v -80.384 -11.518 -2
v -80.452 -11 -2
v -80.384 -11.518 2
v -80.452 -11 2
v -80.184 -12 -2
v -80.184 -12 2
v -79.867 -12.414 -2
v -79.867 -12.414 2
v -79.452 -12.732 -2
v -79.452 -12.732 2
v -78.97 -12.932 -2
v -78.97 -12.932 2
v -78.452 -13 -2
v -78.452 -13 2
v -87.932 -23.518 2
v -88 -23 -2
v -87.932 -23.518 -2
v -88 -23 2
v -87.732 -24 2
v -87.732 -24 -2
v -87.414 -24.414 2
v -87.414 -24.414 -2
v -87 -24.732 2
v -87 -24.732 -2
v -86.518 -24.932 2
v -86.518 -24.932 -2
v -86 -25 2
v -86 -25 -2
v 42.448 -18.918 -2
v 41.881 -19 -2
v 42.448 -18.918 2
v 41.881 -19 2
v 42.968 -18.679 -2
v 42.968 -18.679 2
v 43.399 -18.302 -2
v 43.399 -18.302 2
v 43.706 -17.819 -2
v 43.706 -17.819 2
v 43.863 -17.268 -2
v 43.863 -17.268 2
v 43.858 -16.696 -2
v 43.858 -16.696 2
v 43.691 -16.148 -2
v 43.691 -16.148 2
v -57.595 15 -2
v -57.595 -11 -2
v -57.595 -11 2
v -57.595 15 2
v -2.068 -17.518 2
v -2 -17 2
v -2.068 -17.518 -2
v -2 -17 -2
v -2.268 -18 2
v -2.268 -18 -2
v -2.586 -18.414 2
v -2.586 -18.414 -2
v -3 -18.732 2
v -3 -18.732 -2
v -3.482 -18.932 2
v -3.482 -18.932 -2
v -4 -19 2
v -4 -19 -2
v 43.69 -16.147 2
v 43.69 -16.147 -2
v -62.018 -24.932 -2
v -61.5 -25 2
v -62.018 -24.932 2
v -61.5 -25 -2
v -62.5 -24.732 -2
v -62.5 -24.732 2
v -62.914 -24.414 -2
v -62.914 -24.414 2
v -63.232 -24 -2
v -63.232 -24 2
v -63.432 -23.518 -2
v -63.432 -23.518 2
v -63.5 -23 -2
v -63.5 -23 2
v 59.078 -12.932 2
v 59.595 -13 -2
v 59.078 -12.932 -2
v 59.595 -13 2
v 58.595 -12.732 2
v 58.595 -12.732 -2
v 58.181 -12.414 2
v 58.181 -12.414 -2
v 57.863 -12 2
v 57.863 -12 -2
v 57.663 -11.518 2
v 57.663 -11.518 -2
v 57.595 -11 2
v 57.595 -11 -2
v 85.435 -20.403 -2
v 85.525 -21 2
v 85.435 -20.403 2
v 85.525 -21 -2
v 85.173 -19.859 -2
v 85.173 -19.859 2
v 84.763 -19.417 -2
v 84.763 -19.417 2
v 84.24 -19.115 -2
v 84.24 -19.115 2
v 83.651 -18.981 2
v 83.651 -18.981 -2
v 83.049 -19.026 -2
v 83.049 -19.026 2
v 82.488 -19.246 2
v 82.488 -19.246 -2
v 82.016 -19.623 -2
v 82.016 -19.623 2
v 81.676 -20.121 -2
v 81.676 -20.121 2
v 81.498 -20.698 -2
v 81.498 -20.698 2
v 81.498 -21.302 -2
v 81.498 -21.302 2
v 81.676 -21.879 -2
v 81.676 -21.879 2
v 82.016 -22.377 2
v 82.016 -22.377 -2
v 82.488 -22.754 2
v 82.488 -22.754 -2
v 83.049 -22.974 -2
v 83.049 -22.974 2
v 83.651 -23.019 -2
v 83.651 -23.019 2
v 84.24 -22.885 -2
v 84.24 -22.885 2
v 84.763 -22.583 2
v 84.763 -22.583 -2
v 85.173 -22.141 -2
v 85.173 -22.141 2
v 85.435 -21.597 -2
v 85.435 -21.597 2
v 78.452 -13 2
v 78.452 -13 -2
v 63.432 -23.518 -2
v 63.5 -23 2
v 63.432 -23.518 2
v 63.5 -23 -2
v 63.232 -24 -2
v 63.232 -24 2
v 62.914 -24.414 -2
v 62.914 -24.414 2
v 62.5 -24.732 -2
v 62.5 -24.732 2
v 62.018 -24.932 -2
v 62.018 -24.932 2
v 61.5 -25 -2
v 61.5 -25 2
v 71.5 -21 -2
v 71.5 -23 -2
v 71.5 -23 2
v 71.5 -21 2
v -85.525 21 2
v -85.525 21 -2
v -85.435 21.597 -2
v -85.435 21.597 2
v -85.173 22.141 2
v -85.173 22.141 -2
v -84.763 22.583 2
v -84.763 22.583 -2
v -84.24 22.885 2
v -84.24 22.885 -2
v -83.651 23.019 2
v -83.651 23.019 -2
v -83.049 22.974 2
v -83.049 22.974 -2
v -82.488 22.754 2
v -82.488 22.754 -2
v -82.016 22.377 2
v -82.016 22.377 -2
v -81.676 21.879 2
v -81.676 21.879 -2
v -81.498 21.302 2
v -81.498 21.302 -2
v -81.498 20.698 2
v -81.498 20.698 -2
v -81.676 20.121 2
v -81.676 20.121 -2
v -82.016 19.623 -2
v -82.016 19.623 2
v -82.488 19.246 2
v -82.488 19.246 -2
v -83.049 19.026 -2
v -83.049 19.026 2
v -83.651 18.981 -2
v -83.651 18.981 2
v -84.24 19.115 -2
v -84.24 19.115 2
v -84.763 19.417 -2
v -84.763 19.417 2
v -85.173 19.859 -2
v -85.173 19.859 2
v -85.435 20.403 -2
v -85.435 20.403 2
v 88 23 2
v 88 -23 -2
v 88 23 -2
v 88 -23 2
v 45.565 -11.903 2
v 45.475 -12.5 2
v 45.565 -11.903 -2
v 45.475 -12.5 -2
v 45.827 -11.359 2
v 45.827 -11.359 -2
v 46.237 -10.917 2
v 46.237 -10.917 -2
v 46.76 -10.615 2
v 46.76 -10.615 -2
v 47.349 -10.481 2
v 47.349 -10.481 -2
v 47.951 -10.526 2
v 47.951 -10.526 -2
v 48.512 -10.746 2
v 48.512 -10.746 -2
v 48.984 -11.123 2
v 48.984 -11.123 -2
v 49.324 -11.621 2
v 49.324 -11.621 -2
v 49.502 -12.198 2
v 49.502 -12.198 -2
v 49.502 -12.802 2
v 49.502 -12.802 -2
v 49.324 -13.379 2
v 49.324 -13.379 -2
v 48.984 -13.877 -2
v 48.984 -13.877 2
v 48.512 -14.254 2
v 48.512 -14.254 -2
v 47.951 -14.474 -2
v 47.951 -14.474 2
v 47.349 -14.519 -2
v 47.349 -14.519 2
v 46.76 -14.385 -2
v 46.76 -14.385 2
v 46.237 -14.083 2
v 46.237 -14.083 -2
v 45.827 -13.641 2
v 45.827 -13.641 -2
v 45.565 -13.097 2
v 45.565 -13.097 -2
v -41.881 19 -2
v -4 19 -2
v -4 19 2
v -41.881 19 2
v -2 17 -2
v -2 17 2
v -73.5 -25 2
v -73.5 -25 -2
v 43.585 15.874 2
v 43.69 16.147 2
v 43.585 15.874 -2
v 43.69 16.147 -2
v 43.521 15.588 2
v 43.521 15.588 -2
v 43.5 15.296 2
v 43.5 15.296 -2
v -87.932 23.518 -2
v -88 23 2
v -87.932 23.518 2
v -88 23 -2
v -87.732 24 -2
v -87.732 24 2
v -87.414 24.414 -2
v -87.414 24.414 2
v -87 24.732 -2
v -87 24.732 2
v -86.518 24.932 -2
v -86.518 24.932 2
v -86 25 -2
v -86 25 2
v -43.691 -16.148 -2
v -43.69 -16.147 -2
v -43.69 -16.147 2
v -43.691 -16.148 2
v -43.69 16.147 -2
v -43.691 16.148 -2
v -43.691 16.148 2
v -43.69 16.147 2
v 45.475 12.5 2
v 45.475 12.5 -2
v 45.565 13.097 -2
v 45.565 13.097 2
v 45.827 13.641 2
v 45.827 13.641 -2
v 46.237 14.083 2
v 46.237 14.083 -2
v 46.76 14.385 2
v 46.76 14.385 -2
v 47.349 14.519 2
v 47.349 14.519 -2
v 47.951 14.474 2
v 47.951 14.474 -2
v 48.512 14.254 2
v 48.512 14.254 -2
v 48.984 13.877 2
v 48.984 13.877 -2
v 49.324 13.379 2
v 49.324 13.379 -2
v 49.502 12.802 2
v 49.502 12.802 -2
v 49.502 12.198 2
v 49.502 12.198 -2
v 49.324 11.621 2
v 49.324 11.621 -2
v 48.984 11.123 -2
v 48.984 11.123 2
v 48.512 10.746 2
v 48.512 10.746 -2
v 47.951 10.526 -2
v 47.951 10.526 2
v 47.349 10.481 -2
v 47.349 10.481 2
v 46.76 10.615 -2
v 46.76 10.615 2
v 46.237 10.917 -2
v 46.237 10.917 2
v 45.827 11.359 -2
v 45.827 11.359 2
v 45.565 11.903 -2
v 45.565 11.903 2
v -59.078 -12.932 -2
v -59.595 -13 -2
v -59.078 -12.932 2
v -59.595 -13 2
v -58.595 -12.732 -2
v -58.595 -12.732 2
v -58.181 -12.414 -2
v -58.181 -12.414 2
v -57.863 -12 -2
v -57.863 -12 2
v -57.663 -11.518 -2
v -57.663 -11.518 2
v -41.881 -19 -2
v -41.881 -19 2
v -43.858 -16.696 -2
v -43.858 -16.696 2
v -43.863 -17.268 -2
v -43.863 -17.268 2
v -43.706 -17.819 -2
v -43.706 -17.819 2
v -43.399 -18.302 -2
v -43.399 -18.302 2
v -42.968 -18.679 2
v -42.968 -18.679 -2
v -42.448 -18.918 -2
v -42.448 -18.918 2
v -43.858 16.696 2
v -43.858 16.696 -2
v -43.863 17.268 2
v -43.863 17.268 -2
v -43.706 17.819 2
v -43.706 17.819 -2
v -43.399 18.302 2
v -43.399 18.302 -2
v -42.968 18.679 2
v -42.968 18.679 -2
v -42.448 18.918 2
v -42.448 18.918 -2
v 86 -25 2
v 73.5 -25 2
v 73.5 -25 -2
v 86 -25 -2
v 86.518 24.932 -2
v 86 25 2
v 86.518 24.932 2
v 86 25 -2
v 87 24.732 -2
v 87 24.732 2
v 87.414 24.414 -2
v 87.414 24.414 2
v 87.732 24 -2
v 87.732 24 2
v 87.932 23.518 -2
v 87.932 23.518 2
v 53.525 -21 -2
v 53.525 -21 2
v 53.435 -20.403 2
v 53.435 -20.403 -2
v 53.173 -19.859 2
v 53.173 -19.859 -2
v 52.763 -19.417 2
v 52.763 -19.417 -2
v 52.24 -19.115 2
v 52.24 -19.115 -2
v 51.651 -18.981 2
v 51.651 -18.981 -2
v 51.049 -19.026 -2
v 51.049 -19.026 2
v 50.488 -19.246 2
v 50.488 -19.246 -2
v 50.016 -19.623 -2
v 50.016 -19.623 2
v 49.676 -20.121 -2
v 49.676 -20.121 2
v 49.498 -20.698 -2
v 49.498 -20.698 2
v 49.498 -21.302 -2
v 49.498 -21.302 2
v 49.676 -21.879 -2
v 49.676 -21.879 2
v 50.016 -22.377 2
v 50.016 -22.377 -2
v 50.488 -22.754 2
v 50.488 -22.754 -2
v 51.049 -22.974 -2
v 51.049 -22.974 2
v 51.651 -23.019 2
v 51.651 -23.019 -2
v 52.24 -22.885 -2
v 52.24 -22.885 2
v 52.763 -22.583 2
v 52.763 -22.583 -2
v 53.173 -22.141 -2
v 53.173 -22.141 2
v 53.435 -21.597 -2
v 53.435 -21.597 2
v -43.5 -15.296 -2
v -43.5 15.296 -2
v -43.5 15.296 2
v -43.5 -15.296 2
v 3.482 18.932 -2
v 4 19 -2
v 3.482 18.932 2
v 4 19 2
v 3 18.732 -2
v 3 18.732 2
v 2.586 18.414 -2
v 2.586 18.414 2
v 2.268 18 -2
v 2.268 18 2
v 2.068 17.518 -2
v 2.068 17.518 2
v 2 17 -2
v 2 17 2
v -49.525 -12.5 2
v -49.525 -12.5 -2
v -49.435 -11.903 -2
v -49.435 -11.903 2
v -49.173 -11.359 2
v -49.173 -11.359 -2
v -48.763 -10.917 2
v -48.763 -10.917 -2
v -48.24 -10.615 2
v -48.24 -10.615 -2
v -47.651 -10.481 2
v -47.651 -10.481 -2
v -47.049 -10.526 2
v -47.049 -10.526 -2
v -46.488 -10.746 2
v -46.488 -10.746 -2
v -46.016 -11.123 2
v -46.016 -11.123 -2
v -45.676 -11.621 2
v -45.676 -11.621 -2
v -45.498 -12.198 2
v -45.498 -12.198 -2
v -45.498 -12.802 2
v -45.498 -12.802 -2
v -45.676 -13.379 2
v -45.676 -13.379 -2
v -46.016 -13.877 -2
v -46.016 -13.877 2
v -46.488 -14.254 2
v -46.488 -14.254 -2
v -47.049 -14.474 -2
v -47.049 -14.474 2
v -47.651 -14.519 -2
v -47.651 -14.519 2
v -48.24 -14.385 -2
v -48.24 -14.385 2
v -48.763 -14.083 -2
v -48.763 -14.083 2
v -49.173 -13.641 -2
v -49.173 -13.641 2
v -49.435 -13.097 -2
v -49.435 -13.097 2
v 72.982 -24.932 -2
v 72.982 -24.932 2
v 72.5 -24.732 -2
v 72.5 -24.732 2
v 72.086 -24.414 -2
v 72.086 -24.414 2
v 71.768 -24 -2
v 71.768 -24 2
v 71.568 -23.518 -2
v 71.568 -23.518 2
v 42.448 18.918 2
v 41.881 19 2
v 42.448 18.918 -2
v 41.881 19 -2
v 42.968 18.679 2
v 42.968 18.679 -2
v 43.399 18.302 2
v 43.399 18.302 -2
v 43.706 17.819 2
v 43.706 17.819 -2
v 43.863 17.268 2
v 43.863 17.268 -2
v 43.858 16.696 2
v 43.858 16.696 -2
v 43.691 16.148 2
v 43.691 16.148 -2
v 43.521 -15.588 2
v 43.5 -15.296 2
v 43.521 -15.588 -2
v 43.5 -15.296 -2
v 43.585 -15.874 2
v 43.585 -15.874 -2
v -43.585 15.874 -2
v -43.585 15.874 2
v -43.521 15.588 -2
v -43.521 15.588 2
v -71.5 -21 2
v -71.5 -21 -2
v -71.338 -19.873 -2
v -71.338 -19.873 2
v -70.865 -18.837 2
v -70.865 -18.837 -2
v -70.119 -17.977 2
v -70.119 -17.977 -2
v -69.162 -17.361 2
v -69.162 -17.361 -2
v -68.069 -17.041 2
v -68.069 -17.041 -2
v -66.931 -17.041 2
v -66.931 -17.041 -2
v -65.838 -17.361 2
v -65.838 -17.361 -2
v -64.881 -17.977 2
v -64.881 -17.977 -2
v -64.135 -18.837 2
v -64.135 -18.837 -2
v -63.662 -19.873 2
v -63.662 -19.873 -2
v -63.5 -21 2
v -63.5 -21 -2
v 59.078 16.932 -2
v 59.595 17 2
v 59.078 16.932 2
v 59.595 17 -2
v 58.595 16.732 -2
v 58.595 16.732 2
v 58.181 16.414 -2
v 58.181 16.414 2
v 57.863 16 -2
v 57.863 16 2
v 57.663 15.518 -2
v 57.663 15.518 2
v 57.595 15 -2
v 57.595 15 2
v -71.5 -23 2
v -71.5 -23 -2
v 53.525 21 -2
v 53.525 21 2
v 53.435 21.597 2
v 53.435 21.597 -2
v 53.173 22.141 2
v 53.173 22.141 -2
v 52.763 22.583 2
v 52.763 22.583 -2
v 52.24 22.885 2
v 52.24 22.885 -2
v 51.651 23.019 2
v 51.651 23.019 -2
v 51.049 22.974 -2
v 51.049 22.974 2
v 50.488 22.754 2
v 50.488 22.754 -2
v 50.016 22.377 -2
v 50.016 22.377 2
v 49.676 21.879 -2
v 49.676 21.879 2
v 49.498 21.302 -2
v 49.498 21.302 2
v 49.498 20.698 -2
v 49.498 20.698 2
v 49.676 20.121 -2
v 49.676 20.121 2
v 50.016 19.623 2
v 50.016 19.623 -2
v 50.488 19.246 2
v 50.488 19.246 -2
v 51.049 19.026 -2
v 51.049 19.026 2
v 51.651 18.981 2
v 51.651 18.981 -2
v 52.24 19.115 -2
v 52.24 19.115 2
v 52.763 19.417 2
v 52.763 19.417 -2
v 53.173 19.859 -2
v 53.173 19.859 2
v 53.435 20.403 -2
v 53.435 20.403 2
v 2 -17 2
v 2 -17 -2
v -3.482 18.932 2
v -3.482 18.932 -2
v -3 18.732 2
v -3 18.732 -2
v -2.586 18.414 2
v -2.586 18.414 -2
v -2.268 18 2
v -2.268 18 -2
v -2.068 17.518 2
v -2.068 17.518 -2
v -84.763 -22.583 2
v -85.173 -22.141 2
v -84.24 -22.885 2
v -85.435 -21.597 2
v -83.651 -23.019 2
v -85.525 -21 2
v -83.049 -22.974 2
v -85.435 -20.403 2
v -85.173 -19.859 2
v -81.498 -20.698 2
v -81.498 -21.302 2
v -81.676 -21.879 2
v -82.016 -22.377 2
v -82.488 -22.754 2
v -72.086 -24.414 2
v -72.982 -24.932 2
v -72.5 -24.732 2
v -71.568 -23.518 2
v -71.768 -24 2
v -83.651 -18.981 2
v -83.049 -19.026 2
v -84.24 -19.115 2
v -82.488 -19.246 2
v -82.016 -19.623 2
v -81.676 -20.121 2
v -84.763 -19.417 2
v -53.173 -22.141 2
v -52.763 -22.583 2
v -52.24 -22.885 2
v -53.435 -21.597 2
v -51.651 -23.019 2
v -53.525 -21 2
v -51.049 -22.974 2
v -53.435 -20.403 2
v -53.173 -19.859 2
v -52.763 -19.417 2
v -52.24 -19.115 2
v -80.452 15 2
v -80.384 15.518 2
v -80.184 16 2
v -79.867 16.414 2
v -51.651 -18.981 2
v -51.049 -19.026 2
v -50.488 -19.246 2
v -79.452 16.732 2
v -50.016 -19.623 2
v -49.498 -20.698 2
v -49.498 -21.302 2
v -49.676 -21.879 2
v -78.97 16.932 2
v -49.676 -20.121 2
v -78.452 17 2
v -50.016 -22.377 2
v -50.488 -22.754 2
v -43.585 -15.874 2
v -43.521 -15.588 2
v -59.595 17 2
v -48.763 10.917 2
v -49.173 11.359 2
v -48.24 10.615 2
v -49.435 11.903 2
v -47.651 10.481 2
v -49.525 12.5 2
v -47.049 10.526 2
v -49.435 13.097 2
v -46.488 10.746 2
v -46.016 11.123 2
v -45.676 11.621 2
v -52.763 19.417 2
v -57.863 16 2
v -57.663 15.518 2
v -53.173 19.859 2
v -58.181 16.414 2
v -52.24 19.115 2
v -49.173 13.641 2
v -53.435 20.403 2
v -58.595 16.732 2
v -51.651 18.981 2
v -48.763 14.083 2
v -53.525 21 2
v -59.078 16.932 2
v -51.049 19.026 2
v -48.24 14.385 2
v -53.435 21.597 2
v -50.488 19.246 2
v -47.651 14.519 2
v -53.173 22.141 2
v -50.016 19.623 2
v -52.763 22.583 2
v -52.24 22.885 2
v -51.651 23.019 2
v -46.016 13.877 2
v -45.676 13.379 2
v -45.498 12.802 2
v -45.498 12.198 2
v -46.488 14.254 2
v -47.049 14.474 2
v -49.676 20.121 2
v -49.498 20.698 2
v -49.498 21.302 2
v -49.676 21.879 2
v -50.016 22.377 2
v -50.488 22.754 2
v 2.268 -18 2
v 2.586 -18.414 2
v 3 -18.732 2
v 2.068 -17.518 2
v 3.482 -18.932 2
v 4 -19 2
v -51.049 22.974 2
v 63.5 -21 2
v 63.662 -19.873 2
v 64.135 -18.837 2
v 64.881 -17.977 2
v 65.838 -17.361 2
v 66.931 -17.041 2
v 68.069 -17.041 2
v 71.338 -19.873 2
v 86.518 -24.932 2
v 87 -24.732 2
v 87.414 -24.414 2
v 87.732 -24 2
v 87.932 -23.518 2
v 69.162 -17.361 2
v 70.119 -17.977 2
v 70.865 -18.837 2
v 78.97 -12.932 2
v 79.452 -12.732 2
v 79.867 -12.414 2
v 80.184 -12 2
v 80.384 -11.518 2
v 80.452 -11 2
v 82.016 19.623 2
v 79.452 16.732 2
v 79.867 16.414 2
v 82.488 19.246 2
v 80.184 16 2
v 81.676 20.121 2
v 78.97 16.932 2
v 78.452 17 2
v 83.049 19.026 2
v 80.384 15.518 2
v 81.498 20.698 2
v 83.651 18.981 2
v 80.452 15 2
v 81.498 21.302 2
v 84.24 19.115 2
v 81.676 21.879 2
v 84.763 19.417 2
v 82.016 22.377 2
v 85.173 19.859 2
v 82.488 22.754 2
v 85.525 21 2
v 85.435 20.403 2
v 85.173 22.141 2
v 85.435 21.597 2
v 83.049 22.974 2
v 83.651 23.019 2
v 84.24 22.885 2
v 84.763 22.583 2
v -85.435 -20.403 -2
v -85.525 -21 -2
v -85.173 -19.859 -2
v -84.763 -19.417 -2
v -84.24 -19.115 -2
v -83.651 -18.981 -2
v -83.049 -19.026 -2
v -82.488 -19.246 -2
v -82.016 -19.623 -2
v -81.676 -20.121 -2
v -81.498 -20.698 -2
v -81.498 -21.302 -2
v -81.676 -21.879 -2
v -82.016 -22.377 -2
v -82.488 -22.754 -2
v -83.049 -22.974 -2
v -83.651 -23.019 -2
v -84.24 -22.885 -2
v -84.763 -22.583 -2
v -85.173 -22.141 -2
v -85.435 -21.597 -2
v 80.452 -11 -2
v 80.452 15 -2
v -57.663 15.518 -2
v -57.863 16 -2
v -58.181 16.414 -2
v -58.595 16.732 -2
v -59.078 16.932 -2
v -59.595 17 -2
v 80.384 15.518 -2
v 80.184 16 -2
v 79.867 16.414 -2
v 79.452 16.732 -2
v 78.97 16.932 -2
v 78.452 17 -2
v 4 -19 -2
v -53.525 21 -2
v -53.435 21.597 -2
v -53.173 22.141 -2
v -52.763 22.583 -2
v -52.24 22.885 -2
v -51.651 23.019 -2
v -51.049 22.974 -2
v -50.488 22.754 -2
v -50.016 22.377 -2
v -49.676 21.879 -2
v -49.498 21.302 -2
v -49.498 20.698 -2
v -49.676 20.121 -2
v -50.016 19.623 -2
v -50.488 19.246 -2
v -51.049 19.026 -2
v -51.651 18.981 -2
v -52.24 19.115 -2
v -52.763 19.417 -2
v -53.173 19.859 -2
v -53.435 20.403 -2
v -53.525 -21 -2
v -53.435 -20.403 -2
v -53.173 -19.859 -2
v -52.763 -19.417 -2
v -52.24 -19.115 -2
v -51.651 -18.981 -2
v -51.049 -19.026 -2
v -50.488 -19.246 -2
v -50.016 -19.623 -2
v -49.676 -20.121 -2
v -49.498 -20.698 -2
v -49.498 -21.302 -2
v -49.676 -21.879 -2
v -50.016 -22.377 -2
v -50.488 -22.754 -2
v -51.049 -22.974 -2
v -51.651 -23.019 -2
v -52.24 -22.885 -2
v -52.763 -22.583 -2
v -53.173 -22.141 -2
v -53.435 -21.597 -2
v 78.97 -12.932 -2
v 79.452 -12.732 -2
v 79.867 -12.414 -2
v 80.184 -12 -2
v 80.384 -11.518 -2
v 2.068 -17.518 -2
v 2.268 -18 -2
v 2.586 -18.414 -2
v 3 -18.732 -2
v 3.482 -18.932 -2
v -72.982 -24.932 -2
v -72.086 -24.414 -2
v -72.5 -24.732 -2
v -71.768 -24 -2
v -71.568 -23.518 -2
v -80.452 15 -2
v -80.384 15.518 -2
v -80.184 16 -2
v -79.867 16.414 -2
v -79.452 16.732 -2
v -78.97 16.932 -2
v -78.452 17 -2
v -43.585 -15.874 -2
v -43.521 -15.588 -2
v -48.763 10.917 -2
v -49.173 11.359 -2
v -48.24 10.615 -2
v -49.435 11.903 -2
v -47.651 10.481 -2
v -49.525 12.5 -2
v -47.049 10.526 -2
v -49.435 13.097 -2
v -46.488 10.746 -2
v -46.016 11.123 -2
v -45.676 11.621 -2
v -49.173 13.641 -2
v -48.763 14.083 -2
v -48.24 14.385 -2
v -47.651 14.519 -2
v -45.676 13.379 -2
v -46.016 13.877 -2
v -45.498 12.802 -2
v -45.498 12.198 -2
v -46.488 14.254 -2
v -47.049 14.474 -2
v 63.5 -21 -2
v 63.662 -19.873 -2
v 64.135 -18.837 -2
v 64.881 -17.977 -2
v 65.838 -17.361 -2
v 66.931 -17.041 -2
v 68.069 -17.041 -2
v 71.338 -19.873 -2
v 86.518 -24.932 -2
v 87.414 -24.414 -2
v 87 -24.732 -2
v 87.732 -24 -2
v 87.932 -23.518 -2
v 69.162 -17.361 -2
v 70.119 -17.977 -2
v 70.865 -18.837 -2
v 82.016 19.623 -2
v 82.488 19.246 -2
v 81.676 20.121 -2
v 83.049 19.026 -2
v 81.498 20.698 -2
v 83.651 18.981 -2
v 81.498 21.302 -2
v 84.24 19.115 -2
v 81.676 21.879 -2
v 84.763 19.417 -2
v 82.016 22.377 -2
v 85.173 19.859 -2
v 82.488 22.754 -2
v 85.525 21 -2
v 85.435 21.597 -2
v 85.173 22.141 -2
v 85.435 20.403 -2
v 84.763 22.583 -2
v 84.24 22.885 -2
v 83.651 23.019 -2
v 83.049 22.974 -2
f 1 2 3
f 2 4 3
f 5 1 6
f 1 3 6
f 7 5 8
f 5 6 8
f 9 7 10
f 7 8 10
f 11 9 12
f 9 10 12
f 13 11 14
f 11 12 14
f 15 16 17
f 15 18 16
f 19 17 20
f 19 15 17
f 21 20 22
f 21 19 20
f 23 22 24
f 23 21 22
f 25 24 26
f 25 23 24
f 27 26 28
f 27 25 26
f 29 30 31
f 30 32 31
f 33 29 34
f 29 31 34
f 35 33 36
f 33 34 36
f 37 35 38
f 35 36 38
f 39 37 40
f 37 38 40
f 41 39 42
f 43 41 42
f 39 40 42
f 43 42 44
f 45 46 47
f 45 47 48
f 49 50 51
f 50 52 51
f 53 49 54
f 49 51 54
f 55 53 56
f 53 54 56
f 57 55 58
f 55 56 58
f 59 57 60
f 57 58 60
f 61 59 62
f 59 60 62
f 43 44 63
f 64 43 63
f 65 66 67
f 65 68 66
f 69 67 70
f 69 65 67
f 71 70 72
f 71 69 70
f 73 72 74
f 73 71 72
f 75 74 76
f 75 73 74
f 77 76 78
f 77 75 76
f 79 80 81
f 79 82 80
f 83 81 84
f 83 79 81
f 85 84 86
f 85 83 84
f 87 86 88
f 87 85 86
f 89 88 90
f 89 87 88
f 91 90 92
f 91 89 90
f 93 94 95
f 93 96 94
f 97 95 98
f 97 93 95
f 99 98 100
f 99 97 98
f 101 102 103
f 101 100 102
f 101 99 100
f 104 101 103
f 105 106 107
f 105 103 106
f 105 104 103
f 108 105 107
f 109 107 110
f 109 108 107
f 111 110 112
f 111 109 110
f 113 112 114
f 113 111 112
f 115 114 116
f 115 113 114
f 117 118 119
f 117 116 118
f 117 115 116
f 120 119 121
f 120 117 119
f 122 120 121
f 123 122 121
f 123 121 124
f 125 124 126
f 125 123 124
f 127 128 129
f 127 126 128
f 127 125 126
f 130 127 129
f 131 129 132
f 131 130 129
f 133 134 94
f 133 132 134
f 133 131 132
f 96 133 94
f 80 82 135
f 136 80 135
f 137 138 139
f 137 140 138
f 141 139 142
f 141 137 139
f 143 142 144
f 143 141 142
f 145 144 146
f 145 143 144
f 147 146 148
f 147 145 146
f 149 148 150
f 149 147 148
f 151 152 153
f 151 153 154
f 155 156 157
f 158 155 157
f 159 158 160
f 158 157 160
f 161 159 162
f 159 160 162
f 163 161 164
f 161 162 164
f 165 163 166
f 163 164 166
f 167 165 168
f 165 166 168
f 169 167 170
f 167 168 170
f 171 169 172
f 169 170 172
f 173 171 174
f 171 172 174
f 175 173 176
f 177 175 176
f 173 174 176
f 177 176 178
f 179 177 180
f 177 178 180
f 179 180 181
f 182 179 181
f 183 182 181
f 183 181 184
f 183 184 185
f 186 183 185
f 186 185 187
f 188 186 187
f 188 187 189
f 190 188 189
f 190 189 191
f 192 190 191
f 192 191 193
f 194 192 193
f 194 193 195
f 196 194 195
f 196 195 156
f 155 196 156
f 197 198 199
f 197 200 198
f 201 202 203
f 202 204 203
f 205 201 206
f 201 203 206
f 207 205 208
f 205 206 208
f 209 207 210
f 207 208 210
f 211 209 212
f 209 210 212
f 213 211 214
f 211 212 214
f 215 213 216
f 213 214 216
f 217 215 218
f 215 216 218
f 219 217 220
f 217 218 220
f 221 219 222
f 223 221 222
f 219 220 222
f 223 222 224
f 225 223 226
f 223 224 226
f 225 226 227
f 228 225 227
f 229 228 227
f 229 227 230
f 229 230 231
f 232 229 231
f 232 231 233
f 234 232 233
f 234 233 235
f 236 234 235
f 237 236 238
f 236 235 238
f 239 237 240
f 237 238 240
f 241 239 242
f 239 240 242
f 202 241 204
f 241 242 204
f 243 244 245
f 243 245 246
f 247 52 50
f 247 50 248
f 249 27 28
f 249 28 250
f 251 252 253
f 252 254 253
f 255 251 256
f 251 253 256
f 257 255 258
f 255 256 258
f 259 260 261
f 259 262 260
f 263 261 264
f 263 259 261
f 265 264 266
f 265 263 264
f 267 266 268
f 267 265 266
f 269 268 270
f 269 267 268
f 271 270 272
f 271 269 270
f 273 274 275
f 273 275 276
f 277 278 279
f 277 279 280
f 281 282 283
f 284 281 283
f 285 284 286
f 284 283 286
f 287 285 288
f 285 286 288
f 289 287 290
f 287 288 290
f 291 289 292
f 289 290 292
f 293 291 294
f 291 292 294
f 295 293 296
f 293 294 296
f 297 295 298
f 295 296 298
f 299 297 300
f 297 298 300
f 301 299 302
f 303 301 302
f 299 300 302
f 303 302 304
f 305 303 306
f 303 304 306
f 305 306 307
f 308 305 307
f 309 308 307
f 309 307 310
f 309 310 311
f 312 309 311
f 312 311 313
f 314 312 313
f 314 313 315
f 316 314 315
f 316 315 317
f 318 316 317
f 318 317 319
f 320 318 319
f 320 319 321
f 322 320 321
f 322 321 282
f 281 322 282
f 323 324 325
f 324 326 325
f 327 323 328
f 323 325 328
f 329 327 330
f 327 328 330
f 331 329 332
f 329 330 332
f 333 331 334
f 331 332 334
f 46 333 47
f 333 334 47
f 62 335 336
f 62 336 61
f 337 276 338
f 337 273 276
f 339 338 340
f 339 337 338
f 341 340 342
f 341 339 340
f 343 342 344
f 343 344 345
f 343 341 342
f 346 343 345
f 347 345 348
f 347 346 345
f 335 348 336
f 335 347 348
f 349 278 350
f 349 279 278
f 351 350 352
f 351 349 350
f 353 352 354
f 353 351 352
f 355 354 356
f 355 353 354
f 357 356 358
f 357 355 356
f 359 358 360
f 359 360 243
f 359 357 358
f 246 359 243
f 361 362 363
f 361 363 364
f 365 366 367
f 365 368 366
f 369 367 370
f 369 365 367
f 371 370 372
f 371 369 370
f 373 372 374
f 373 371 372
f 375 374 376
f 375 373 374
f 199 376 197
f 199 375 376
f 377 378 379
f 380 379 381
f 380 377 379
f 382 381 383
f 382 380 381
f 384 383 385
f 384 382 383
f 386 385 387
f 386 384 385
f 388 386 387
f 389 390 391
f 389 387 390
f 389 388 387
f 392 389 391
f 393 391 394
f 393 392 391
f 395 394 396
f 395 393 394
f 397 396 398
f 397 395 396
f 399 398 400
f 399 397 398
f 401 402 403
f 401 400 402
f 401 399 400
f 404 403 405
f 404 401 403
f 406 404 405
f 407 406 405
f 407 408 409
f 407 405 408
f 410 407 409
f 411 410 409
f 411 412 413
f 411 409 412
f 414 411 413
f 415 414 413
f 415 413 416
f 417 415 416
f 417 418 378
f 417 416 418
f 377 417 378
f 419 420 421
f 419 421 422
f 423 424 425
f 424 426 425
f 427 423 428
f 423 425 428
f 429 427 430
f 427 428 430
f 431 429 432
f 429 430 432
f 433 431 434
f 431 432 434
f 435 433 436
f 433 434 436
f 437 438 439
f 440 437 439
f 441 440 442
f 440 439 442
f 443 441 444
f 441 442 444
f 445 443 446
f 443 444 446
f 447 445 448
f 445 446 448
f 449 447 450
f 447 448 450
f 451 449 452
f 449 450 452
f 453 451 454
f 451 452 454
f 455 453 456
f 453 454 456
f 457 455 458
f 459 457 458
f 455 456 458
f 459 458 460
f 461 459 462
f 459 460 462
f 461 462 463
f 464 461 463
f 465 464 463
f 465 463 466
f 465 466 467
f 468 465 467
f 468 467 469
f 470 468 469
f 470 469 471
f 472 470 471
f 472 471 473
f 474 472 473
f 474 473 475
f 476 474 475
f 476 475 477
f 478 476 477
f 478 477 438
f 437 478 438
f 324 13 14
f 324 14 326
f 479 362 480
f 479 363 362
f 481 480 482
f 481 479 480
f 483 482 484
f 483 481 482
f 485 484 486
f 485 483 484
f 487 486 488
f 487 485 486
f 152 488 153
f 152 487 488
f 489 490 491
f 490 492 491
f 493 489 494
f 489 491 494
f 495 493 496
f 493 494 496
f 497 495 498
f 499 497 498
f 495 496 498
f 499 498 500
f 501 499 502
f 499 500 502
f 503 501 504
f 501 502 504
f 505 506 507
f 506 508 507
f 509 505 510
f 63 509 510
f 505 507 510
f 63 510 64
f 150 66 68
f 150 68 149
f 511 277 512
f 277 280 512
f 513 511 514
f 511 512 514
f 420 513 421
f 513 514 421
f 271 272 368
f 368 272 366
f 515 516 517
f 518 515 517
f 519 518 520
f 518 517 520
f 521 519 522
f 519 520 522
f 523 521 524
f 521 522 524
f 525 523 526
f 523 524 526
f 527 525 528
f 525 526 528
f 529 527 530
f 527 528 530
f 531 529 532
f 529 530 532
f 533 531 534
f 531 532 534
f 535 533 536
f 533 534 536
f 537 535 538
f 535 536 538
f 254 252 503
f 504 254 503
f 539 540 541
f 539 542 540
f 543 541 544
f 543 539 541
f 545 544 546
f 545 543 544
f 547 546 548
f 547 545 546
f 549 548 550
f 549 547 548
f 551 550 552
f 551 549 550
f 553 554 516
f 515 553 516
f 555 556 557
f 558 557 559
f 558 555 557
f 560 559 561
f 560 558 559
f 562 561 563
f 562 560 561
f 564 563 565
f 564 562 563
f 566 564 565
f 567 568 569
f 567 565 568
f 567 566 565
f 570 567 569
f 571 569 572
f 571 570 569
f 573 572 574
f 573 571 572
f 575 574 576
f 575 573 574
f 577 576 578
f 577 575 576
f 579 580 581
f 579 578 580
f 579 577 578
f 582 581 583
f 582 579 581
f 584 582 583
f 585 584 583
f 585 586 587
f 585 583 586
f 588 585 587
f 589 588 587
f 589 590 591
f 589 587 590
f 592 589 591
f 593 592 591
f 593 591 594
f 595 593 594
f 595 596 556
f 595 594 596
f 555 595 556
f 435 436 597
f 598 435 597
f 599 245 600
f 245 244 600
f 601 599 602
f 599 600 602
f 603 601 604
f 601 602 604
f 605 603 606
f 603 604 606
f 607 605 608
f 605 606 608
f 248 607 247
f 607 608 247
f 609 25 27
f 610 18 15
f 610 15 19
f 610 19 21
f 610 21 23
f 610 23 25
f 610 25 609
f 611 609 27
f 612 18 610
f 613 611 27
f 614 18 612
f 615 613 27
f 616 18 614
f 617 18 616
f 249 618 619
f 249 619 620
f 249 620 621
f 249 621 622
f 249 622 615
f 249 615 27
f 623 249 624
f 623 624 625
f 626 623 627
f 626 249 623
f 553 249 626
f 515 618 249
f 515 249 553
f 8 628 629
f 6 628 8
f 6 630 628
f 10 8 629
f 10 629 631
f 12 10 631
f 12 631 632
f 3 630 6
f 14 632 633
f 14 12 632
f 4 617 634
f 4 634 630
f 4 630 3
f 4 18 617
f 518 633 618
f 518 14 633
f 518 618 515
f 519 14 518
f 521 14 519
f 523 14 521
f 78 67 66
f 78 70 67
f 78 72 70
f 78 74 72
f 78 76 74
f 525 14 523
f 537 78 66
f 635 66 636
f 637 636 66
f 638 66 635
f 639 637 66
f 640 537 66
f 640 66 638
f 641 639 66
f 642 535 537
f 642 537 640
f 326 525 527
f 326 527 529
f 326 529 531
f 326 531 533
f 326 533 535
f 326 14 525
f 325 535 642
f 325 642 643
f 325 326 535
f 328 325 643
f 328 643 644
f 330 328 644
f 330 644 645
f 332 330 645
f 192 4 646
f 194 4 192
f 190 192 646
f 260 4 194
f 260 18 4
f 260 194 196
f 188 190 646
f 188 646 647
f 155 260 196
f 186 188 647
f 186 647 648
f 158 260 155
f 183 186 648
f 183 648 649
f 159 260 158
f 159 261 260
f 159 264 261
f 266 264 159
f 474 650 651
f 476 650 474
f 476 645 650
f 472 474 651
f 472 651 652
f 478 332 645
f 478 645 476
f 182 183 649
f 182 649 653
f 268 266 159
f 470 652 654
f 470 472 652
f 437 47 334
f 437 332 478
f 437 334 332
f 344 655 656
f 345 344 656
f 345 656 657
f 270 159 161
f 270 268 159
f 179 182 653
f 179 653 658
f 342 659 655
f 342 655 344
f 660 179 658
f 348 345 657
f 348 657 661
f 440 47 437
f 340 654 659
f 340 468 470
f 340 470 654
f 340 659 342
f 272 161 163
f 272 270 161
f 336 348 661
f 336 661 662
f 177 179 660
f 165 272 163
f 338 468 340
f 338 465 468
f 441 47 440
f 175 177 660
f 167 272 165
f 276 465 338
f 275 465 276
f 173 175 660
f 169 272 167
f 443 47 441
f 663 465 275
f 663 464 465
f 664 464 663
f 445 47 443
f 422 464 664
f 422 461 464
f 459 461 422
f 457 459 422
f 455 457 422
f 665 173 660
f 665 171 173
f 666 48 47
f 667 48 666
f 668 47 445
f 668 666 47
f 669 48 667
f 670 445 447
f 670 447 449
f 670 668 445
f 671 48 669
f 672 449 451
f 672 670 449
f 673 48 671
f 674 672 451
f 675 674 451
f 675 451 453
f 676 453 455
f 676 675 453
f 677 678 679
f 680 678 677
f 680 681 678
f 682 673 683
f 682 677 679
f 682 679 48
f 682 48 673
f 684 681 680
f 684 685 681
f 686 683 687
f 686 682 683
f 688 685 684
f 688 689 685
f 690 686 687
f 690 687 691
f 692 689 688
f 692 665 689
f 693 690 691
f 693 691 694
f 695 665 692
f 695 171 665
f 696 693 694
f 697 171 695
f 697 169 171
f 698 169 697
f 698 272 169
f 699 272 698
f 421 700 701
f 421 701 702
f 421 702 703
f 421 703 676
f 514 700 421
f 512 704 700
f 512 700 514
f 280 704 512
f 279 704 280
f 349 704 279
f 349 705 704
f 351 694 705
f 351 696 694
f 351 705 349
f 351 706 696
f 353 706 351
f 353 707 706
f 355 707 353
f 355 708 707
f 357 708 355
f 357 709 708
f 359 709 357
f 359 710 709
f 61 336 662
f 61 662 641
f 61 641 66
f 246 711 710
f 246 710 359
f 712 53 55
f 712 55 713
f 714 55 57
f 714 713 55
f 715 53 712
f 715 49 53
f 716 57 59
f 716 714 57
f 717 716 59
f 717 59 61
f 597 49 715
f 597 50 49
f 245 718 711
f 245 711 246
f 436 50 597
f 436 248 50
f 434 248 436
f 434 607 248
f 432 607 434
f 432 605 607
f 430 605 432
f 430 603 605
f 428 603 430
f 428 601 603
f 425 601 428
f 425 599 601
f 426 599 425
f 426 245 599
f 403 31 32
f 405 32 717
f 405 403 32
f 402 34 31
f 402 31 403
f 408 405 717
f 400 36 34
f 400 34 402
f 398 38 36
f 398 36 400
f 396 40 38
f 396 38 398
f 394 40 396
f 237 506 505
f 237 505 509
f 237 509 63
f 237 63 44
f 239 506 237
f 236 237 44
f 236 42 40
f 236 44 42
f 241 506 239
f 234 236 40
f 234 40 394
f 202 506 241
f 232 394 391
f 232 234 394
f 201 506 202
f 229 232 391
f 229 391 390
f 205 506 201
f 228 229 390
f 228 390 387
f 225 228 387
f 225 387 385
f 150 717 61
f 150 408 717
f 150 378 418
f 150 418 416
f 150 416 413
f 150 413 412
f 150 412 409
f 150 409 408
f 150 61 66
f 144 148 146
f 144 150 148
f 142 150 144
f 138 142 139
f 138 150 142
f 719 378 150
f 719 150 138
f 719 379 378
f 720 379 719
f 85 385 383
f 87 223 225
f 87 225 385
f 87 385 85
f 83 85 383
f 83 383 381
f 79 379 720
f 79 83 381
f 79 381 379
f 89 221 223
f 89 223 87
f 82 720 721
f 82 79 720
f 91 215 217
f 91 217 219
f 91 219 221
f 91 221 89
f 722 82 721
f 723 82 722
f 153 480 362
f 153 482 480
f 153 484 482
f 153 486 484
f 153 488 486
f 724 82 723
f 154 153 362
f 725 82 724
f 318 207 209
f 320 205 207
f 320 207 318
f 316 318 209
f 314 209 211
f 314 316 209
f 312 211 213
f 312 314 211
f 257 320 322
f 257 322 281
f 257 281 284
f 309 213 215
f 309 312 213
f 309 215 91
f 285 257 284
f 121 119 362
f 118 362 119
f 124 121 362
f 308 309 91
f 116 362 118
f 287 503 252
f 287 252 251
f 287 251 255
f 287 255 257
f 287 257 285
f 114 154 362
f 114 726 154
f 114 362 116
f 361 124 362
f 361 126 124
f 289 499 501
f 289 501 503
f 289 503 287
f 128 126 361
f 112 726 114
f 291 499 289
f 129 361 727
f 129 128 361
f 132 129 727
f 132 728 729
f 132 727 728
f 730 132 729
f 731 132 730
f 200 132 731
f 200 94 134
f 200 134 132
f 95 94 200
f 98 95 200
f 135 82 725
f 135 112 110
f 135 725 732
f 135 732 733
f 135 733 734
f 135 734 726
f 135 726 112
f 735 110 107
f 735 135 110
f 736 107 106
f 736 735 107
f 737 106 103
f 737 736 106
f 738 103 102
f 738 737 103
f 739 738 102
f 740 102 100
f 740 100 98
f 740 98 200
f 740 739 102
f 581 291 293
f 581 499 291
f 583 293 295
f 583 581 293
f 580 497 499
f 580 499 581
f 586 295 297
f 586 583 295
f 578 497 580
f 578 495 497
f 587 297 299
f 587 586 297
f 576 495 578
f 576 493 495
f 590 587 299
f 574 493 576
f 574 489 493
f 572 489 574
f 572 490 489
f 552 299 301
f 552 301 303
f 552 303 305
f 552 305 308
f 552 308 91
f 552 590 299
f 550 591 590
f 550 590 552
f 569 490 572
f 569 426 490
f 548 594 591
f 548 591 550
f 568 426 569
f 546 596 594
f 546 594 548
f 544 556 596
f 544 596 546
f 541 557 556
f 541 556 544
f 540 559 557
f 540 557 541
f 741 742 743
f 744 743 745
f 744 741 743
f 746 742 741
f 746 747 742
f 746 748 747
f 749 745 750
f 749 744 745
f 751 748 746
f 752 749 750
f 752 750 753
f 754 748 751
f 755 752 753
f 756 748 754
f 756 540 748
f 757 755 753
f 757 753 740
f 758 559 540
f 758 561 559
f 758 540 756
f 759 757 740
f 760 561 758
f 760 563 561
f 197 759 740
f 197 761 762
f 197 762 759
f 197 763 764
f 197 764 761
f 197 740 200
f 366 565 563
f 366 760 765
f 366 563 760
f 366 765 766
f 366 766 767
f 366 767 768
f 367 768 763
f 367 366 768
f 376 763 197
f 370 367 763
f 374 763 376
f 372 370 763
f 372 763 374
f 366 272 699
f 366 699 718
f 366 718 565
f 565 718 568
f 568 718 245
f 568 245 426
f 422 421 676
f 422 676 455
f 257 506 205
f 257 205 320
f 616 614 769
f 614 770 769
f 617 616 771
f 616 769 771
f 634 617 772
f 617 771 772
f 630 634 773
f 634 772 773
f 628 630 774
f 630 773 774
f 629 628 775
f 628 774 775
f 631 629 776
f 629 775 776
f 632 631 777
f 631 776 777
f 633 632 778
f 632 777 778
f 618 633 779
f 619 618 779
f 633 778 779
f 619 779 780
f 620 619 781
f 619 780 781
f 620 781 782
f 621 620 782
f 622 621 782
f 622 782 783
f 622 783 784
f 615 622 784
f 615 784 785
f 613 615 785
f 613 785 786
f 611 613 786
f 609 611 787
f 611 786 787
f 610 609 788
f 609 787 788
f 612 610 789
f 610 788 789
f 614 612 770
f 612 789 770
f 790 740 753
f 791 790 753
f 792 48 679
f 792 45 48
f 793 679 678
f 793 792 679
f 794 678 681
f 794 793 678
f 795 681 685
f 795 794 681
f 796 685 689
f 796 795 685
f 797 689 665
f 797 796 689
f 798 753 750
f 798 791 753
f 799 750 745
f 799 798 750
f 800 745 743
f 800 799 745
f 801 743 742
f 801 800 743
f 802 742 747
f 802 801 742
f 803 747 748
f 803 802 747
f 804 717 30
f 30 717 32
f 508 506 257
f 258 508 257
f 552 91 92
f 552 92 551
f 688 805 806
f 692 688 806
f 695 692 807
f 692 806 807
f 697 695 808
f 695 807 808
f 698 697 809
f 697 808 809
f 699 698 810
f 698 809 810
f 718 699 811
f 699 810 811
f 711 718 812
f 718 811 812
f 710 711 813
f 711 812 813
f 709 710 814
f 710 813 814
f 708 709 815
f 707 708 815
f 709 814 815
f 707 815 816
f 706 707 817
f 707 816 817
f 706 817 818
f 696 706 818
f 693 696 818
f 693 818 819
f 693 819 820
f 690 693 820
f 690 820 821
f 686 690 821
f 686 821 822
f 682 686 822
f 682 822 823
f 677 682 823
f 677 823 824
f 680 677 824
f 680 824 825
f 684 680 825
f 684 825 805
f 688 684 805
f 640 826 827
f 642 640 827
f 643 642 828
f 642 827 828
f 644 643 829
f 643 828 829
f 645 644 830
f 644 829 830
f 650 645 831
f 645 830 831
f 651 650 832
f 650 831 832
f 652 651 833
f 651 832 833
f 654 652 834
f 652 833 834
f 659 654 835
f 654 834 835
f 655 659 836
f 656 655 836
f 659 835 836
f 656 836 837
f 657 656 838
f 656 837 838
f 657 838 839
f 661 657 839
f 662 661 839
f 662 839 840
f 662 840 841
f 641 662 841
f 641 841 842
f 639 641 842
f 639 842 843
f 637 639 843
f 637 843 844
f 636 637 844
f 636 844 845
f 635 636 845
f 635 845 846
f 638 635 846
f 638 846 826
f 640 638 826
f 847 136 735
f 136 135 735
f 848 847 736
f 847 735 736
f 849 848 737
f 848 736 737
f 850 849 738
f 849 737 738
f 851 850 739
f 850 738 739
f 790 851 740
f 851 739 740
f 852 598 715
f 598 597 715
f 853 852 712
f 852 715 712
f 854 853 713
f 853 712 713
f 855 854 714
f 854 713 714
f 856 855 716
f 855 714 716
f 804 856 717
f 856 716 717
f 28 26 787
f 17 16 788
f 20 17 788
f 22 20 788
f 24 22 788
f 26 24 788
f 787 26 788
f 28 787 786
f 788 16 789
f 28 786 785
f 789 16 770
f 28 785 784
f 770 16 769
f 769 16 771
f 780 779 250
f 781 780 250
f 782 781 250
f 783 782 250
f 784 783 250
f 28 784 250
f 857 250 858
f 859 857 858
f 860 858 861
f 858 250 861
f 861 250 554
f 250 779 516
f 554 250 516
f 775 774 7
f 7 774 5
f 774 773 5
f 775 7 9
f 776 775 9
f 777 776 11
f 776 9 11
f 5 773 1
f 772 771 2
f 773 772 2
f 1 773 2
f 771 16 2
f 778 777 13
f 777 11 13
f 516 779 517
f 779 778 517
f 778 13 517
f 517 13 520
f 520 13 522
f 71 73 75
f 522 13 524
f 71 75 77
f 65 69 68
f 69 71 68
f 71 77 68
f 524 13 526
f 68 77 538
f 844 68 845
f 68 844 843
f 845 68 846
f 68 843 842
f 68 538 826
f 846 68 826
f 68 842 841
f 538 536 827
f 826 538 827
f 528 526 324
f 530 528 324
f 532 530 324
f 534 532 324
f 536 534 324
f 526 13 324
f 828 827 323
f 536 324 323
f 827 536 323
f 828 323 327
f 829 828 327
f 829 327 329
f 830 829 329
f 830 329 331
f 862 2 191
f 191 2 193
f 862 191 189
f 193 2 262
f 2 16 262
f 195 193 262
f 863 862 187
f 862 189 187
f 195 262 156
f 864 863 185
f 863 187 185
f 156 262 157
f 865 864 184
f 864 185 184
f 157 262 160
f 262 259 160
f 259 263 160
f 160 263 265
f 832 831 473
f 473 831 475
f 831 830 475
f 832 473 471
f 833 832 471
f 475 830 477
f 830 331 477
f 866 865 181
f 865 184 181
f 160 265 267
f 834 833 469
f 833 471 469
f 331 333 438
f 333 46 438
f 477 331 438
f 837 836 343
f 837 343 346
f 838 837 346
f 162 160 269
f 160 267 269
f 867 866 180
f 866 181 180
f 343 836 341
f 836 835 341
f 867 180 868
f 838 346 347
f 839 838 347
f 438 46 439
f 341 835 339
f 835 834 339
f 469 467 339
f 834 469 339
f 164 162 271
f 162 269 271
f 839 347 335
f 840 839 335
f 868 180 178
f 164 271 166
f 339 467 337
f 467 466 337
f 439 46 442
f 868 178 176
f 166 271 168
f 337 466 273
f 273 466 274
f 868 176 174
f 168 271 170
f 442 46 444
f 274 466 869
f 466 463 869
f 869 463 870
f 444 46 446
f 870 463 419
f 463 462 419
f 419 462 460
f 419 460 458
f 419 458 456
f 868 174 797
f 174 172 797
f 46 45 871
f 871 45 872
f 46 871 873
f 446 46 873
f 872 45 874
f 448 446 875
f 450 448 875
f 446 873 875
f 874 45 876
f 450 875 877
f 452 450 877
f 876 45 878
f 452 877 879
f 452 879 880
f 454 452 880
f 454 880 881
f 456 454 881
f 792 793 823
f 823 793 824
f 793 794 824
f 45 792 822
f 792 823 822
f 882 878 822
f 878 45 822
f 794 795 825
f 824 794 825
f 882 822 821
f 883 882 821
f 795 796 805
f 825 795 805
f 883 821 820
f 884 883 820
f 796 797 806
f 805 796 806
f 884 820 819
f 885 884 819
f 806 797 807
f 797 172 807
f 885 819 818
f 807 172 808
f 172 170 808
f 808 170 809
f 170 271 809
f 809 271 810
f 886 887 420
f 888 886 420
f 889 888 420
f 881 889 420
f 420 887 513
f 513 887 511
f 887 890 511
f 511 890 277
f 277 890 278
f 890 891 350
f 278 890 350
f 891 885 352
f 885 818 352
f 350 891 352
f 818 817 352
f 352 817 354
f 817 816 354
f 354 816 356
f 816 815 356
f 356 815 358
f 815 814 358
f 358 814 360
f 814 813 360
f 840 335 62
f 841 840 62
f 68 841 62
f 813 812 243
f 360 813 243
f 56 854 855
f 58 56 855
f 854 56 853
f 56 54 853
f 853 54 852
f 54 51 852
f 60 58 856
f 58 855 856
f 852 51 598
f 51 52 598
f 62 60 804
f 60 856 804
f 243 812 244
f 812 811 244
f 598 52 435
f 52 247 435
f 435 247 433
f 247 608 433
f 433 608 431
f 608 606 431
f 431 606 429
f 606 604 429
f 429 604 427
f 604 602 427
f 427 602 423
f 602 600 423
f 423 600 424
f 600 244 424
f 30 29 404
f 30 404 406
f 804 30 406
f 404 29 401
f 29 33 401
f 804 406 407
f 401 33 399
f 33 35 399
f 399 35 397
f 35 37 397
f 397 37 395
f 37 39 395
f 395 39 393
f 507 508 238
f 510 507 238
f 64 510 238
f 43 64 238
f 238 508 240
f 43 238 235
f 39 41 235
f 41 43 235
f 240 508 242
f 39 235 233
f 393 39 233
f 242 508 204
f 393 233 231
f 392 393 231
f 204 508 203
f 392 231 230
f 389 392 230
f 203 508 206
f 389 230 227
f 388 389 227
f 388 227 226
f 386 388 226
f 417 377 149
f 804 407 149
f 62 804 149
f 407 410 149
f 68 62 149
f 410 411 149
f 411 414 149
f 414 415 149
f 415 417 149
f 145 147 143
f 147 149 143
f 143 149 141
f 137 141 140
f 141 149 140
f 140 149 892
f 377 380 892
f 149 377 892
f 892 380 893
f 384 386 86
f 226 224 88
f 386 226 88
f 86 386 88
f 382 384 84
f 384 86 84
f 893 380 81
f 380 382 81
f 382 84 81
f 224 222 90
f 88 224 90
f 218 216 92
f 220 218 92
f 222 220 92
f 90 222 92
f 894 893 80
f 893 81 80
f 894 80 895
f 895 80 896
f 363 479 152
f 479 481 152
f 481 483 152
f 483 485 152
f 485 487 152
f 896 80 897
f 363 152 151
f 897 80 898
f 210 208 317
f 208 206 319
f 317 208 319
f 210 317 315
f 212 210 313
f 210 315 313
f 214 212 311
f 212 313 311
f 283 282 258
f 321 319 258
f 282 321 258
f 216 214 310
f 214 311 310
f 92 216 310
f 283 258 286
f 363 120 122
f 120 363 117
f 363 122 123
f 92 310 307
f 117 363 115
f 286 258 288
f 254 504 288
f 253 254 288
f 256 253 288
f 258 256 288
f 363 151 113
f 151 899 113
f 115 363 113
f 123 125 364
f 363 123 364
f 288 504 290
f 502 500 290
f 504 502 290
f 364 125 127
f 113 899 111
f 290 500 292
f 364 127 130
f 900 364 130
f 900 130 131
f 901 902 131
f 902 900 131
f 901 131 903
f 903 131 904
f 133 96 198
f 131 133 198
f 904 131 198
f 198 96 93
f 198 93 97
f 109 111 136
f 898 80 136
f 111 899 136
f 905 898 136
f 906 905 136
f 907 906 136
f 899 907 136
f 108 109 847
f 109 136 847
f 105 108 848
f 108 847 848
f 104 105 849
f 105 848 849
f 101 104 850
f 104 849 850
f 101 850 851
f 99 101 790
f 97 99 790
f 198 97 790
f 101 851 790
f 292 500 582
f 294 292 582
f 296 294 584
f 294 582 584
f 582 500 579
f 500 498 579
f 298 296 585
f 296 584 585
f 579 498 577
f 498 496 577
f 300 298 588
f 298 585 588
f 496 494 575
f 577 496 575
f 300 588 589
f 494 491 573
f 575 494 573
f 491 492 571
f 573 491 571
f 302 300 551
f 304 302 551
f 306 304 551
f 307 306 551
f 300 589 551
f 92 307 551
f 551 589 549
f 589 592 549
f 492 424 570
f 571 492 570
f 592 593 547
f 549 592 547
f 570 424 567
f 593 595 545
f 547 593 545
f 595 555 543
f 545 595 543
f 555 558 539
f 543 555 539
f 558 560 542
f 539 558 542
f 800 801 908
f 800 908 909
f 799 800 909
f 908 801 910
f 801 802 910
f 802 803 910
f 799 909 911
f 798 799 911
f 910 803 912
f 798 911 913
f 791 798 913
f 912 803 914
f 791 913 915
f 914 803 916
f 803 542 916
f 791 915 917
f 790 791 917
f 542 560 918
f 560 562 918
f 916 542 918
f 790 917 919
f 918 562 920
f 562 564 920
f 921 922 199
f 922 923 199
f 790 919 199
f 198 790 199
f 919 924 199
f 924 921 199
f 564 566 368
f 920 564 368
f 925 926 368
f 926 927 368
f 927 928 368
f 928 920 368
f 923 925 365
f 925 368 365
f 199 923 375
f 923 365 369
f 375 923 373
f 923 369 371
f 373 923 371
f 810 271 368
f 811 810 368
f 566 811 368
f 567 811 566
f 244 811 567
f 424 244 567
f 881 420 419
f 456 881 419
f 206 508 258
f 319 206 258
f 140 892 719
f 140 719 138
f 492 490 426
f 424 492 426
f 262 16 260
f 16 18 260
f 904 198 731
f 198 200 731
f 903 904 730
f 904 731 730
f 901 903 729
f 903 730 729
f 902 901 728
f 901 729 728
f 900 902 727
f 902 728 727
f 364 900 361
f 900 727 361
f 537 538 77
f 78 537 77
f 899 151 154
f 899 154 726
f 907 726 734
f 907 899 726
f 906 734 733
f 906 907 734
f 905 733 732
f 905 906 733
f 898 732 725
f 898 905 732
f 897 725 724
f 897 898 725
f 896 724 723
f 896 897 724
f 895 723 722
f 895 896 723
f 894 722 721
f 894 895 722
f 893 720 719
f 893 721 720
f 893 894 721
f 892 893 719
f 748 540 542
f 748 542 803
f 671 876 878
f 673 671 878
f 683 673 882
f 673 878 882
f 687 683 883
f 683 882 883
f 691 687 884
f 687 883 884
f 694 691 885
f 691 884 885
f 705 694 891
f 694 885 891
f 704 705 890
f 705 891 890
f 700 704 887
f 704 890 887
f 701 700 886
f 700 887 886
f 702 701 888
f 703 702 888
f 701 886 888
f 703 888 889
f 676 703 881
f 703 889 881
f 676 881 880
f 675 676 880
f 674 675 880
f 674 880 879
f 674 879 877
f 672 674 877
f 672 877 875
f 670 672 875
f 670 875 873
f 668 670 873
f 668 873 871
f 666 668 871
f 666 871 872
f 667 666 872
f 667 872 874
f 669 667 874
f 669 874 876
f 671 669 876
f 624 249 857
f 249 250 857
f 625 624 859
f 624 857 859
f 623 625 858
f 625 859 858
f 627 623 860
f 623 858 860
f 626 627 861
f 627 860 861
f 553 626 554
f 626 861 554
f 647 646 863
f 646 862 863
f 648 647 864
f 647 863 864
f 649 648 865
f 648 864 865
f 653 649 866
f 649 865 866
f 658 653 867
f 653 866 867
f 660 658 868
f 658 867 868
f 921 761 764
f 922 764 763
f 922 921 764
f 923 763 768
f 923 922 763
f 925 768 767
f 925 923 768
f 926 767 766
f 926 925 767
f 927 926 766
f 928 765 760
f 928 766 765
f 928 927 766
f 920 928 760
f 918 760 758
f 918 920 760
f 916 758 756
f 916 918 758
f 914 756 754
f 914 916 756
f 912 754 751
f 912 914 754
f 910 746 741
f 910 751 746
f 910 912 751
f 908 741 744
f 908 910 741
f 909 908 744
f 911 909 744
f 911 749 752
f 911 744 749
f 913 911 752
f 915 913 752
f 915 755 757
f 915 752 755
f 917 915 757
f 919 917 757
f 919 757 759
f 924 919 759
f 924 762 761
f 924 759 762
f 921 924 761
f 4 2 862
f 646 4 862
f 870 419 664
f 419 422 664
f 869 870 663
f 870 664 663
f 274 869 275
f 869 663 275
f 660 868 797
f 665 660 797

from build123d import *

# Parameters (mm, degrees)
SKETCH_1_W          = 176
SKETCH_1_H          = 50
EXTRUDE_1_DEPTH     = 2
SKETCH_2_R          = 2.025
CUT_EXTRUDE_1_DEPTH = 22
CUT_EXTRUDE_2_DEPTH = 17
FILLET_1_R          = 2
SKETCH_4_R          = 2.025
CUT_EXTRUDE_3_DEPTH = 5
CUT_EXTRUDE_5_DEPTH = 15.5
SKETCH_8_W          = 22.857142857
SKETCH_8_H          = 30
CUT_EXTRUDE_6_DEPTH = 15.5
FILLET_2_R          = 2


with BuildPart() as part:
    # 草图1 → 凸台-拉伸1 (new, symmetric)
    with BuildSketch(Plane.XY):
        Rectangle(SKETCH_1_W, SKETCH_1_H)
    extrude(amount=EXTRUDE_1_DEPTH, both=True)

    # 草图2 → 切除-拉伸1 (cut, symmetric)
    with BuildSketch(Plane(origin=(0, 0, -2), x_dir=(-1, 0, 0), z_dir=(0, 0, -1))):
        with Locations((51.5, 21)):
            Circle(SKETCH_2_R)
        with Locations((51.5, -21)):
            Circle(SKETCH_2_R)
        with Locations((83.5, 21)):
            Circle(SKETCH_2_R)
        with Locations((83.5, -21)):
            Circle(SKETCH_2_R)
    cut_extrude_1 = extrude(amount=CUT_EXTRUDE_1_DEPTH, both=True, mode=Mode.SUBTRACT)

    # 镜向1: 切除-拉伸1 across plane
    add(cut_extrude_1.mirror(Plane(origin=(0, 0, 0), x_dir=(0, 0, 1), z_dir=(1, 0, 0))), mode=Mode.SUBTRACT)

    # 草图3 → 切除-拉伸2 (cut, symmetric)
    with BuildSketch(Plane(origin=(0, 0, -2), x_dir=(-1, 0, 0), z_dir=(0, 0, -1))):
        with BuildLine():
            Line((63.5, -21), (63.5, -25))
            Line((63.5, -25), (71.5, -25))
            Line((71.5, -25), (71.5, -21))
            ThreePointArc((71.5, -21), (67.5, -17), (63.5, -21))
        make_face()
    cut_extrude_2 = extrude(amount=CUT_EXTRUDE_2_DEPTH, both=True, mode=Mode.SUBTRACT)

    # 镜向2: 切除-拉伸2 across plane
    add(cut_extrude_2.mirror(Plane(origin=(0, 0, 0), x_dir=(0, 0, 1), z_dir=(1, 0, 0))), mode=Mode.SUBTRACT)

    # 圆角1
    fillet_1_edges = [part.edges().sort_by_distance(p)[0] for p in [
        (-71.5, -25, 0),
        (-63.5, -25, 0),
        (88, -25, 0),
        (-88, -25, 0),
        (-88, 25, 0),
        (88, 25, 0),
        (63.5, -25, 0),
        (71.5, -25, 0),
    ]]
    fillet(fillet_1_edges, radius=FILLET_1_R)

    # 草图4 → 切除-拉伸3 (cut, symmetric)
    with BuildSketch(Plane(origin=(0, 0, -2), x_dir=(-1, 0, 0), z_dir=(0, 0, -1))):
        with Locations((47.5, -12.5)):
            Circle(SKETCH_4_R)
        with Locations((47.5, 12.5)):
            Circle(SKETCH_4_R)
        with Locations((-47.5, 12.5)):
            Circle(SKETCH_4_R)
        with Locations((-47.5, -12.5)):
            Circle(SKETCH_4_R)
    extrude(amount=CUT_EXTRUDE_3_DEPTH, both=True, mode=Mode.SUBTRACT)

    # 草图7 → 切除-拉伸5 (cut, symmetric)
    with BuildSketch(Plane.XY.offset(2)):
        Polygon((-2, 19), (-45.032854639, 19), (-43.5, 15.742683893), (-43.5, -15.742683893), (-45.032854639, -19), (-2, -19), align=None)
        Polygon((45.032854639, 19), (2, 19), (2, -19), (45.032854639, -19), (43.5, -15.742683893), (43.5, 15.742683893), align=None)
    extrude(amount=CUT_EXTRUDE_5_DEPTH, both=True, mode=Mode.SUBTRACT)

    # 草图8 → 切除-拉伸6 (cut, symmetric)
    with BuildSketch(Plane.XY.offset(2)):
        with Locations((-69.023809524, 2)):
            Rectangle(SKETCH_8_W, SKETCH_8_H)
        with Locations((69.023809524, 2)):
            Rectangle(SKETCH_8_W, SKETCH_8_H)
    extrude(amount=CUT_EXTRUDE_6_DEPTH, both=True, mode=Mode.SUBTRACT)

    # 圆角2
    fillet_2_edges = [part.edges().sort_by_distance(p)[0] for p in [
        (-2, 19, 0),
        (-2, -19, 0),
        (-45.032854639, -19, 0),
        (-43.5, -15.742683893, 0),
        (-43.5, 15.742683893, 0),
        (-45.032854639, 19, 0),
        (2, 19, 0),
        (45.032854639, 19, 0),
        (43.5, 15.742683893, 0),
        (43.5, -15.742683893, 0),
        (45.032854639, -19, 0),
        (2, -19, 0),
        (-80.452380952, -13, 0),
        (-80.452380952, 17, 0),
        (-57.595238095, 17, 0),
        (-57.595238095, -13, 0),
        (80.452380952, 17, 0),
        (80.452380952, -13, 0),
        (57.595238095, -13, 0),
        (57.595238095, 17, 0),
    ]]
    fillet(fillet_2_edges, radius=FILLET_2_R)


solid = part.part
